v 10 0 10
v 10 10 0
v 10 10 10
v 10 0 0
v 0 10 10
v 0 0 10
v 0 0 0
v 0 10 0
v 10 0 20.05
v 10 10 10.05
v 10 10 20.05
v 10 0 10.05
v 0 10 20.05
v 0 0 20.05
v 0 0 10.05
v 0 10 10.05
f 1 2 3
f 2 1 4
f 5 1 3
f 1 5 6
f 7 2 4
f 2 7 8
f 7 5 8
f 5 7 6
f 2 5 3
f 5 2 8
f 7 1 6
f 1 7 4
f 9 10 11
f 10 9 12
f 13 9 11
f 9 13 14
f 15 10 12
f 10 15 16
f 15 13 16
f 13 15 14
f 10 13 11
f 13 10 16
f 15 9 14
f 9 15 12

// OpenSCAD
cube([10,10,10]);
translate([0,0,10.05]) {
	cube([10,10,10]);
}
